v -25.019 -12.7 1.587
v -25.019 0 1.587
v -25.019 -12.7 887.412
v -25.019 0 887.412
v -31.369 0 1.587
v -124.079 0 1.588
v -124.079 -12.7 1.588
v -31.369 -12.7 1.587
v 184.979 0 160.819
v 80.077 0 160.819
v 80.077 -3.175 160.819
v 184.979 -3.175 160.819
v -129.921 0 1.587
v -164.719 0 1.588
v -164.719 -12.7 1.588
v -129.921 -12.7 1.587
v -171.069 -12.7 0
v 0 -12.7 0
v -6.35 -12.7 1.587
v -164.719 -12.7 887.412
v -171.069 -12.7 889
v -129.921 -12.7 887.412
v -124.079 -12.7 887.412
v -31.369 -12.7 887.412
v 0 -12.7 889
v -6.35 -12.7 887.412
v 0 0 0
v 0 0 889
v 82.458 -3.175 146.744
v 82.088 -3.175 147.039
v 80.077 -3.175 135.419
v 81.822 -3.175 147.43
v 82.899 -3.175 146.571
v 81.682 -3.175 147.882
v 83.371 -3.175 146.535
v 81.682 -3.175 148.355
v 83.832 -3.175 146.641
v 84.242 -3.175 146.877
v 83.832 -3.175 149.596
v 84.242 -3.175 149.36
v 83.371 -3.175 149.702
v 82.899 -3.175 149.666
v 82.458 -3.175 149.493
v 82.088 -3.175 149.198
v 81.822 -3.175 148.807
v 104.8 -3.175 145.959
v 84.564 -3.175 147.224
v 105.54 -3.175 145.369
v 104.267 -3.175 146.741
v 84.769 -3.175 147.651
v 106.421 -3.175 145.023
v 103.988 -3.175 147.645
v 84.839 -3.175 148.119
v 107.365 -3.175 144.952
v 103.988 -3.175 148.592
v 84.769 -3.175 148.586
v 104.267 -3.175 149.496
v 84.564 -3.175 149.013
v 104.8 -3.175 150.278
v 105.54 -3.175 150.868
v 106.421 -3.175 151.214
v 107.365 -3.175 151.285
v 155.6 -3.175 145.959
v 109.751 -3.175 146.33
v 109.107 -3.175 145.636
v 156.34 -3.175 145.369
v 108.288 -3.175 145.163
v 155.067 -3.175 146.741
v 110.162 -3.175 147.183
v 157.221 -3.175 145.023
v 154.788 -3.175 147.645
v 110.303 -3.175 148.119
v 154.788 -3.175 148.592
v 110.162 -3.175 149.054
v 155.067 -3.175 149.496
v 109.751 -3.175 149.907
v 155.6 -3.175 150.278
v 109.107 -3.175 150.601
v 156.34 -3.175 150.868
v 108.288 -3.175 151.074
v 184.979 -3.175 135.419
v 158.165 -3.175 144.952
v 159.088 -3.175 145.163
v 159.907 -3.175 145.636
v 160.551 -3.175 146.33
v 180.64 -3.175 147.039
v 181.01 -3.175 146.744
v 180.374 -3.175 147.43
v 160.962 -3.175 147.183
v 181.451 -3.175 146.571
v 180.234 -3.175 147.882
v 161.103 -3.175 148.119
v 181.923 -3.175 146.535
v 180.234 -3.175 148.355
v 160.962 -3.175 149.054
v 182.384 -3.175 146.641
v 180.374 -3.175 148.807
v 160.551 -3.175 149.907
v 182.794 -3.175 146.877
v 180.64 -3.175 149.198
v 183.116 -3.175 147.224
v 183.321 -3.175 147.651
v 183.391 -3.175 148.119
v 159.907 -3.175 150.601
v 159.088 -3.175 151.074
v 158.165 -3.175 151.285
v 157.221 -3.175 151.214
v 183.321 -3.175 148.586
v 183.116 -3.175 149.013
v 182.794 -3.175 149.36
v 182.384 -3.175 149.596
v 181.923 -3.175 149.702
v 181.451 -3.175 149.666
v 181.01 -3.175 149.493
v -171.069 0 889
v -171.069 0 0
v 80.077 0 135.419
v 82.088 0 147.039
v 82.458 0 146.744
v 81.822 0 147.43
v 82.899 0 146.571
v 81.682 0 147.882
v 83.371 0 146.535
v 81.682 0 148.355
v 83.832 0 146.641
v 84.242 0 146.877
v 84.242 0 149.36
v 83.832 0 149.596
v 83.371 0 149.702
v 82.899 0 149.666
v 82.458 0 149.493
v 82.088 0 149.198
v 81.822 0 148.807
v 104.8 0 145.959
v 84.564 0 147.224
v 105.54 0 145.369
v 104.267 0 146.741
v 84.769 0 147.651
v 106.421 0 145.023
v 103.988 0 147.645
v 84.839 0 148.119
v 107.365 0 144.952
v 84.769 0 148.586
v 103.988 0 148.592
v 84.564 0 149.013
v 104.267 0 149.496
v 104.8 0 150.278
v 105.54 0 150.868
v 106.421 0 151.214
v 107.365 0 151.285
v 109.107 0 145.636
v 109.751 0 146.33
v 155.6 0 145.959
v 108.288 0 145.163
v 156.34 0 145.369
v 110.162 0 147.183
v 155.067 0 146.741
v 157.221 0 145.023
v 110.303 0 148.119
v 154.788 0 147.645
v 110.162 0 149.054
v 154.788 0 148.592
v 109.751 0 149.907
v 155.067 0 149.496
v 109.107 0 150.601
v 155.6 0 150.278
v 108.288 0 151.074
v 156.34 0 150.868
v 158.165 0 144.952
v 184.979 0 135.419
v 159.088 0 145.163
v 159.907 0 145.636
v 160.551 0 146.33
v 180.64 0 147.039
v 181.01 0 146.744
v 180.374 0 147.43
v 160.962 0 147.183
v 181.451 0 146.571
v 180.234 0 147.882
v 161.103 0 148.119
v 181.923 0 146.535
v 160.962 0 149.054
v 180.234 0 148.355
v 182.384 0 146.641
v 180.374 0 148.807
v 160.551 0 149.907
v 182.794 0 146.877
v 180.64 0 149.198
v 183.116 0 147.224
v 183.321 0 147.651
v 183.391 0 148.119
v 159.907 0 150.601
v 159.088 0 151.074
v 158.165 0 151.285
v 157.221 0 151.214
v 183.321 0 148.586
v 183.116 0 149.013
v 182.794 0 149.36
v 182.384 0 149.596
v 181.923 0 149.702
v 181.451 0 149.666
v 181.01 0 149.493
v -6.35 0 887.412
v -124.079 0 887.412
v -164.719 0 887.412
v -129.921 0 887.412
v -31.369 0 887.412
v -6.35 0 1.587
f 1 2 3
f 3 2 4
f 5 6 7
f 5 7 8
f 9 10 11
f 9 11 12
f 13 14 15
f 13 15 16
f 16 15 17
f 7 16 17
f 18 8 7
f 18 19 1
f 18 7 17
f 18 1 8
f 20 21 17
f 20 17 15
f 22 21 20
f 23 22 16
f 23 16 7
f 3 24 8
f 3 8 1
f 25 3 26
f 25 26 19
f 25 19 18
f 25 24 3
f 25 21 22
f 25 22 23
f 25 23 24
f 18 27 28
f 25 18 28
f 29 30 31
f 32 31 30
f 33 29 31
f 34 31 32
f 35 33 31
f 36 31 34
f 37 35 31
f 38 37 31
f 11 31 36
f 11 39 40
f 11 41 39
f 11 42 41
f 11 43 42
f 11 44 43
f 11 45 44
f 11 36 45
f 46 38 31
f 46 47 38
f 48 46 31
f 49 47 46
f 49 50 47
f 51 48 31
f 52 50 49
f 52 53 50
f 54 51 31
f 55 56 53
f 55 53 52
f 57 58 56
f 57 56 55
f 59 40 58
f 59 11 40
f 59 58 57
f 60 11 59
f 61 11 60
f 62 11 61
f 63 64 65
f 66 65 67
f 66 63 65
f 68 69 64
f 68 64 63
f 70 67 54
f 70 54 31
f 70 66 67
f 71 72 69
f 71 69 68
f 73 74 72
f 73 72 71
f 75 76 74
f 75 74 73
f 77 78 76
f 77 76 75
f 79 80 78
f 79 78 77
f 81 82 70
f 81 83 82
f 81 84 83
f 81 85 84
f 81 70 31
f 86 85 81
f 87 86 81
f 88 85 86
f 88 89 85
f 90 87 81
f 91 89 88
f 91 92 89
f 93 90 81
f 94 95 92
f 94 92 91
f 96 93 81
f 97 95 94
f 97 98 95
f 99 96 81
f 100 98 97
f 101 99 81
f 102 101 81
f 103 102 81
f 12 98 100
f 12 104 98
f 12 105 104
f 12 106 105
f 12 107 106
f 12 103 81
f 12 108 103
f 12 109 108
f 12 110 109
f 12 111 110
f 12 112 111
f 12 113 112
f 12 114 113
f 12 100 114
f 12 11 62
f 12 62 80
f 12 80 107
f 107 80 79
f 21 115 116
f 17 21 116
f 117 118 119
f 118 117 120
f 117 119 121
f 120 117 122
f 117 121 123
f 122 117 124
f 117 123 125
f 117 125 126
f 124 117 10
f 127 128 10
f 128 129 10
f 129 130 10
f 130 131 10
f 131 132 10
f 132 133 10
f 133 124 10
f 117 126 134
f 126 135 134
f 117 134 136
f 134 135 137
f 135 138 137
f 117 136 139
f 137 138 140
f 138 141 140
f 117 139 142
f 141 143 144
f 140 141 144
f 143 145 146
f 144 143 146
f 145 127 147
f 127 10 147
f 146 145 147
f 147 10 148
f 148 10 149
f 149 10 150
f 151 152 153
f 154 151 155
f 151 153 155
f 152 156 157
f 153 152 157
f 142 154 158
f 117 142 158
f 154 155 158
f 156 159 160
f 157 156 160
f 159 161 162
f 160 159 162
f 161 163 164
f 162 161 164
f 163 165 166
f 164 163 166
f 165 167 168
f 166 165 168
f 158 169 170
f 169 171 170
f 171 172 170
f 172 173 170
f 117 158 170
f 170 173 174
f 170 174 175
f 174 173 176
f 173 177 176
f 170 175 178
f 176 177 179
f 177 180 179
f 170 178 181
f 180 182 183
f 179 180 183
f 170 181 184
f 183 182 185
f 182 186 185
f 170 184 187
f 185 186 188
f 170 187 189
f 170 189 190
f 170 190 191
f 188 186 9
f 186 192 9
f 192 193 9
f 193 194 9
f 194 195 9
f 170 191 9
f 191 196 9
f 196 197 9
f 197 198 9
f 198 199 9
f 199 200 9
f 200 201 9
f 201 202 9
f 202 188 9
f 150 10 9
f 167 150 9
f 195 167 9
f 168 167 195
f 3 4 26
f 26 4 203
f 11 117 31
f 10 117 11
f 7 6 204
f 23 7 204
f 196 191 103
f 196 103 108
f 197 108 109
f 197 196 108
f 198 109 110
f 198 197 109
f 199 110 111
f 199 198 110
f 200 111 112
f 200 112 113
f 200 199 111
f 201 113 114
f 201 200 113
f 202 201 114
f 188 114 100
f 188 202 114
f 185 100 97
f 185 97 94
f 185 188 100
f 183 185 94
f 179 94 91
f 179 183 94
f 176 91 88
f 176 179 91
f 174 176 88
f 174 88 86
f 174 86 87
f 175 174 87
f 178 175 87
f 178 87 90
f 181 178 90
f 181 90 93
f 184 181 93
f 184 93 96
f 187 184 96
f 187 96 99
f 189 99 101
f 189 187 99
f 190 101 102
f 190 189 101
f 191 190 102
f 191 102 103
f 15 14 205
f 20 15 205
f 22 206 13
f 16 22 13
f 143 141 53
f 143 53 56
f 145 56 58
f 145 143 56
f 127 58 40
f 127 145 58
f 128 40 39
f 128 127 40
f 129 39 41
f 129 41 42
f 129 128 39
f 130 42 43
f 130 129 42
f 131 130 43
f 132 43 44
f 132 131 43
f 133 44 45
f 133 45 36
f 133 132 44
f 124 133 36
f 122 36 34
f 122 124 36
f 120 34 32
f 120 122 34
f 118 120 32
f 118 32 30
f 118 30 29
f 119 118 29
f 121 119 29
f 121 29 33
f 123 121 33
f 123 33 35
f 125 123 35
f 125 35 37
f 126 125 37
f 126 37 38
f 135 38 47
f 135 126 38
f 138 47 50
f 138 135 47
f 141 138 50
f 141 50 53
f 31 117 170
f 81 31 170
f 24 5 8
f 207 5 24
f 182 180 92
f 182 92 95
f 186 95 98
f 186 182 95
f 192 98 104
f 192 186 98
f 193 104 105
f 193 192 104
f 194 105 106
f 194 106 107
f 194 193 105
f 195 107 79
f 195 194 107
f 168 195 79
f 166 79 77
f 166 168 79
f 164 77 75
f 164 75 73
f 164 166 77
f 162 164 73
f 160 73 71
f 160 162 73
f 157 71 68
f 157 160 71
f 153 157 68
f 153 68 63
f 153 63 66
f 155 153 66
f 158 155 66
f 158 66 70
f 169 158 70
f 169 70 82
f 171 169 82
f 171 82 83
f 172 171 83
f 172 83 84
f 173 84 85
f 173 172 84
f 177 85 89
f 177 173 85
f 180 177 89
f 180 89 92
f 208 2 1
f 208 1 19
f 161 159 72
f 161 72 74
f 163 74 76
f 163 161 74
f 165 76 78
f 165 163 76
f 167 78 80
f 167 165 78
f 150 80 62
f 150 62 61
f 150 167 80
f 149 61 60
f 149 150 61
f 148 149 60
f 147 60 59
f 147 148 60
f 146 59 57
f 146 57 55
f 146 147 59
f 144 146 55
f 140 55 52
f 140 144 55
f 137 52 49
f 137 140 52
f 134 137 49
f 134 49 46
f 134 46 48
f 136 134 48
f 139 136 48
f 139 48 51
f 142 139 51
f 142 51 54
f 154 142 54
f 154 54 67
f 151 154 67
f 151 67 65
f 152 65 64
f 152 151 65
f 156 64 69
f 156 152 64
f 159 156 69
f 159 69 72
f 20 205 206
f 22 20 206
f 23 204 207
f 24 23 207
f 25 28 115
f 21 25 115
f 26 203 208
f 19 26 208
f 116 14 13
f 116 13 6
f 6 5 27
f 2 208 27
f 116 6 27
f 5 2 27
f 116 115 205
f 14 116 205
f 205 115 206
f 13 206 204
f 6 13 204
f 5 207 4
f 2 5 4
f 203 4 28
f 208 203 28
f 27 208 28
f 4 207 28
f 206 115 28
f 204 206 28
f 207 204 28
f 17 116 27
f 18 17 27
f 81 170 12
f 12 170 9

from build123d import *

# Parameters (mm, degrees)
F0_W     = 6.35
F0_H     = 885.825
F0_W_2   = 5.842
F0_H_2   = 1.5875
F0_W_3   = 18.669
F0_W_4   = 92.71
F0_W_5   = 34.798
F1_DEPTH = 12.7
F2_W     = 104.902
F2_H     = 25.4
F2_R     = 1.5875
F2_R_2   = 3.175
F3_DEPTH = 3.175


with BuildPart() as f1:
    # F0 (on Front) → F1 (new body)
    with BuildSketch(Plane.XZ):
        with Locations((-167.894, 444.5)):
            Rectangle(F0_W, F0_H)
        with Locations((-127, 444.5)):
            Rectangle(F0_W_2, F0_H)
        with Locations((-28.194, 444.5)):
            Rectangle(F0_W, F0_H)
        with Locations((-3.175, 444.5)):
            Rectangle(F0_W, F0_H)
        with Locations((-3.175, 888.20625)):
            Rectangle(F0_W, F0_H_2)
        with Locations((-15.6845, 888.20625)):
            Rectangle(F0_W_3, F0_H_2)
        with Locations((-77.724, 888.20625)):
            Rectangle(F0_W_4, F0_H_2)
        with Locations((-127, 888.20625)):
            Rectangle(F0_W_2, F0_H_2)
        with Locations((-147.32, 888.20625)):
            Rectangle(F0_W_5, F0_H_2)
        with Locations((-167.894, 888.20625)):
            Rectangle(F0_W, F0_H_2)
        with Locations((-28.194, 888.20625)):
            Rectangle(F0_W, F0_H_2)
        with Locations((-167.894, 0.79375)):
            Rectangle(F0_W, F0_H_2)
        with Locations((-147.32, 0.79375)):
            Rectangle(F0_W_5, F0_H_2)
        with Locations((-127, 0.79375)):
            Rectangle(F0_W_2, F0_H_2)
        with Locations((-77.724, 0.79375)):
            Rectangle(F0_W_4, F0_H_2)
        with Locations((-15.6845, 0.79375)):
            Rectangle(F0_W_3, F0_H_2)
        with Locations((-28.194, 0.79375)):
            Rectangle(F0_W, F0_H_2)
        with Locations((-3.175, 0.79375)):
            Rectangle(F0_W, F0_H_2)
    extrude(amount=F1_DEPTH)


with BuildPart() as f3:
    # F2 (on Front) → F3 (new body)
    with BuildSketch(Plane.XZ):
        with Locations((132.5279174538, 148.1185257435)):
            Rectangle(F2_W, F2_H)
        with Locations((83.2519174538, 148.1185257435)):
            Circle(F2_R, mode=Mode.SUBTRACT)
        with Locations((107.1279174538, 148.1185257435)):
            Circle(F2_R_2, mode=Mode.SUBTRACT)
        with Locations((157.9279174538, 148.1185257435)):
            Circle(F2_R_2, mode=Mode.SUBTRACT)
        with Locations((181.8039174538, 148.1185257435)):
            Circle(F2_R, mode=Mode.SUBTRACT)
    extrude(amount=F3_DEPTH)


solid = Compound([f1.part, f3.part])
